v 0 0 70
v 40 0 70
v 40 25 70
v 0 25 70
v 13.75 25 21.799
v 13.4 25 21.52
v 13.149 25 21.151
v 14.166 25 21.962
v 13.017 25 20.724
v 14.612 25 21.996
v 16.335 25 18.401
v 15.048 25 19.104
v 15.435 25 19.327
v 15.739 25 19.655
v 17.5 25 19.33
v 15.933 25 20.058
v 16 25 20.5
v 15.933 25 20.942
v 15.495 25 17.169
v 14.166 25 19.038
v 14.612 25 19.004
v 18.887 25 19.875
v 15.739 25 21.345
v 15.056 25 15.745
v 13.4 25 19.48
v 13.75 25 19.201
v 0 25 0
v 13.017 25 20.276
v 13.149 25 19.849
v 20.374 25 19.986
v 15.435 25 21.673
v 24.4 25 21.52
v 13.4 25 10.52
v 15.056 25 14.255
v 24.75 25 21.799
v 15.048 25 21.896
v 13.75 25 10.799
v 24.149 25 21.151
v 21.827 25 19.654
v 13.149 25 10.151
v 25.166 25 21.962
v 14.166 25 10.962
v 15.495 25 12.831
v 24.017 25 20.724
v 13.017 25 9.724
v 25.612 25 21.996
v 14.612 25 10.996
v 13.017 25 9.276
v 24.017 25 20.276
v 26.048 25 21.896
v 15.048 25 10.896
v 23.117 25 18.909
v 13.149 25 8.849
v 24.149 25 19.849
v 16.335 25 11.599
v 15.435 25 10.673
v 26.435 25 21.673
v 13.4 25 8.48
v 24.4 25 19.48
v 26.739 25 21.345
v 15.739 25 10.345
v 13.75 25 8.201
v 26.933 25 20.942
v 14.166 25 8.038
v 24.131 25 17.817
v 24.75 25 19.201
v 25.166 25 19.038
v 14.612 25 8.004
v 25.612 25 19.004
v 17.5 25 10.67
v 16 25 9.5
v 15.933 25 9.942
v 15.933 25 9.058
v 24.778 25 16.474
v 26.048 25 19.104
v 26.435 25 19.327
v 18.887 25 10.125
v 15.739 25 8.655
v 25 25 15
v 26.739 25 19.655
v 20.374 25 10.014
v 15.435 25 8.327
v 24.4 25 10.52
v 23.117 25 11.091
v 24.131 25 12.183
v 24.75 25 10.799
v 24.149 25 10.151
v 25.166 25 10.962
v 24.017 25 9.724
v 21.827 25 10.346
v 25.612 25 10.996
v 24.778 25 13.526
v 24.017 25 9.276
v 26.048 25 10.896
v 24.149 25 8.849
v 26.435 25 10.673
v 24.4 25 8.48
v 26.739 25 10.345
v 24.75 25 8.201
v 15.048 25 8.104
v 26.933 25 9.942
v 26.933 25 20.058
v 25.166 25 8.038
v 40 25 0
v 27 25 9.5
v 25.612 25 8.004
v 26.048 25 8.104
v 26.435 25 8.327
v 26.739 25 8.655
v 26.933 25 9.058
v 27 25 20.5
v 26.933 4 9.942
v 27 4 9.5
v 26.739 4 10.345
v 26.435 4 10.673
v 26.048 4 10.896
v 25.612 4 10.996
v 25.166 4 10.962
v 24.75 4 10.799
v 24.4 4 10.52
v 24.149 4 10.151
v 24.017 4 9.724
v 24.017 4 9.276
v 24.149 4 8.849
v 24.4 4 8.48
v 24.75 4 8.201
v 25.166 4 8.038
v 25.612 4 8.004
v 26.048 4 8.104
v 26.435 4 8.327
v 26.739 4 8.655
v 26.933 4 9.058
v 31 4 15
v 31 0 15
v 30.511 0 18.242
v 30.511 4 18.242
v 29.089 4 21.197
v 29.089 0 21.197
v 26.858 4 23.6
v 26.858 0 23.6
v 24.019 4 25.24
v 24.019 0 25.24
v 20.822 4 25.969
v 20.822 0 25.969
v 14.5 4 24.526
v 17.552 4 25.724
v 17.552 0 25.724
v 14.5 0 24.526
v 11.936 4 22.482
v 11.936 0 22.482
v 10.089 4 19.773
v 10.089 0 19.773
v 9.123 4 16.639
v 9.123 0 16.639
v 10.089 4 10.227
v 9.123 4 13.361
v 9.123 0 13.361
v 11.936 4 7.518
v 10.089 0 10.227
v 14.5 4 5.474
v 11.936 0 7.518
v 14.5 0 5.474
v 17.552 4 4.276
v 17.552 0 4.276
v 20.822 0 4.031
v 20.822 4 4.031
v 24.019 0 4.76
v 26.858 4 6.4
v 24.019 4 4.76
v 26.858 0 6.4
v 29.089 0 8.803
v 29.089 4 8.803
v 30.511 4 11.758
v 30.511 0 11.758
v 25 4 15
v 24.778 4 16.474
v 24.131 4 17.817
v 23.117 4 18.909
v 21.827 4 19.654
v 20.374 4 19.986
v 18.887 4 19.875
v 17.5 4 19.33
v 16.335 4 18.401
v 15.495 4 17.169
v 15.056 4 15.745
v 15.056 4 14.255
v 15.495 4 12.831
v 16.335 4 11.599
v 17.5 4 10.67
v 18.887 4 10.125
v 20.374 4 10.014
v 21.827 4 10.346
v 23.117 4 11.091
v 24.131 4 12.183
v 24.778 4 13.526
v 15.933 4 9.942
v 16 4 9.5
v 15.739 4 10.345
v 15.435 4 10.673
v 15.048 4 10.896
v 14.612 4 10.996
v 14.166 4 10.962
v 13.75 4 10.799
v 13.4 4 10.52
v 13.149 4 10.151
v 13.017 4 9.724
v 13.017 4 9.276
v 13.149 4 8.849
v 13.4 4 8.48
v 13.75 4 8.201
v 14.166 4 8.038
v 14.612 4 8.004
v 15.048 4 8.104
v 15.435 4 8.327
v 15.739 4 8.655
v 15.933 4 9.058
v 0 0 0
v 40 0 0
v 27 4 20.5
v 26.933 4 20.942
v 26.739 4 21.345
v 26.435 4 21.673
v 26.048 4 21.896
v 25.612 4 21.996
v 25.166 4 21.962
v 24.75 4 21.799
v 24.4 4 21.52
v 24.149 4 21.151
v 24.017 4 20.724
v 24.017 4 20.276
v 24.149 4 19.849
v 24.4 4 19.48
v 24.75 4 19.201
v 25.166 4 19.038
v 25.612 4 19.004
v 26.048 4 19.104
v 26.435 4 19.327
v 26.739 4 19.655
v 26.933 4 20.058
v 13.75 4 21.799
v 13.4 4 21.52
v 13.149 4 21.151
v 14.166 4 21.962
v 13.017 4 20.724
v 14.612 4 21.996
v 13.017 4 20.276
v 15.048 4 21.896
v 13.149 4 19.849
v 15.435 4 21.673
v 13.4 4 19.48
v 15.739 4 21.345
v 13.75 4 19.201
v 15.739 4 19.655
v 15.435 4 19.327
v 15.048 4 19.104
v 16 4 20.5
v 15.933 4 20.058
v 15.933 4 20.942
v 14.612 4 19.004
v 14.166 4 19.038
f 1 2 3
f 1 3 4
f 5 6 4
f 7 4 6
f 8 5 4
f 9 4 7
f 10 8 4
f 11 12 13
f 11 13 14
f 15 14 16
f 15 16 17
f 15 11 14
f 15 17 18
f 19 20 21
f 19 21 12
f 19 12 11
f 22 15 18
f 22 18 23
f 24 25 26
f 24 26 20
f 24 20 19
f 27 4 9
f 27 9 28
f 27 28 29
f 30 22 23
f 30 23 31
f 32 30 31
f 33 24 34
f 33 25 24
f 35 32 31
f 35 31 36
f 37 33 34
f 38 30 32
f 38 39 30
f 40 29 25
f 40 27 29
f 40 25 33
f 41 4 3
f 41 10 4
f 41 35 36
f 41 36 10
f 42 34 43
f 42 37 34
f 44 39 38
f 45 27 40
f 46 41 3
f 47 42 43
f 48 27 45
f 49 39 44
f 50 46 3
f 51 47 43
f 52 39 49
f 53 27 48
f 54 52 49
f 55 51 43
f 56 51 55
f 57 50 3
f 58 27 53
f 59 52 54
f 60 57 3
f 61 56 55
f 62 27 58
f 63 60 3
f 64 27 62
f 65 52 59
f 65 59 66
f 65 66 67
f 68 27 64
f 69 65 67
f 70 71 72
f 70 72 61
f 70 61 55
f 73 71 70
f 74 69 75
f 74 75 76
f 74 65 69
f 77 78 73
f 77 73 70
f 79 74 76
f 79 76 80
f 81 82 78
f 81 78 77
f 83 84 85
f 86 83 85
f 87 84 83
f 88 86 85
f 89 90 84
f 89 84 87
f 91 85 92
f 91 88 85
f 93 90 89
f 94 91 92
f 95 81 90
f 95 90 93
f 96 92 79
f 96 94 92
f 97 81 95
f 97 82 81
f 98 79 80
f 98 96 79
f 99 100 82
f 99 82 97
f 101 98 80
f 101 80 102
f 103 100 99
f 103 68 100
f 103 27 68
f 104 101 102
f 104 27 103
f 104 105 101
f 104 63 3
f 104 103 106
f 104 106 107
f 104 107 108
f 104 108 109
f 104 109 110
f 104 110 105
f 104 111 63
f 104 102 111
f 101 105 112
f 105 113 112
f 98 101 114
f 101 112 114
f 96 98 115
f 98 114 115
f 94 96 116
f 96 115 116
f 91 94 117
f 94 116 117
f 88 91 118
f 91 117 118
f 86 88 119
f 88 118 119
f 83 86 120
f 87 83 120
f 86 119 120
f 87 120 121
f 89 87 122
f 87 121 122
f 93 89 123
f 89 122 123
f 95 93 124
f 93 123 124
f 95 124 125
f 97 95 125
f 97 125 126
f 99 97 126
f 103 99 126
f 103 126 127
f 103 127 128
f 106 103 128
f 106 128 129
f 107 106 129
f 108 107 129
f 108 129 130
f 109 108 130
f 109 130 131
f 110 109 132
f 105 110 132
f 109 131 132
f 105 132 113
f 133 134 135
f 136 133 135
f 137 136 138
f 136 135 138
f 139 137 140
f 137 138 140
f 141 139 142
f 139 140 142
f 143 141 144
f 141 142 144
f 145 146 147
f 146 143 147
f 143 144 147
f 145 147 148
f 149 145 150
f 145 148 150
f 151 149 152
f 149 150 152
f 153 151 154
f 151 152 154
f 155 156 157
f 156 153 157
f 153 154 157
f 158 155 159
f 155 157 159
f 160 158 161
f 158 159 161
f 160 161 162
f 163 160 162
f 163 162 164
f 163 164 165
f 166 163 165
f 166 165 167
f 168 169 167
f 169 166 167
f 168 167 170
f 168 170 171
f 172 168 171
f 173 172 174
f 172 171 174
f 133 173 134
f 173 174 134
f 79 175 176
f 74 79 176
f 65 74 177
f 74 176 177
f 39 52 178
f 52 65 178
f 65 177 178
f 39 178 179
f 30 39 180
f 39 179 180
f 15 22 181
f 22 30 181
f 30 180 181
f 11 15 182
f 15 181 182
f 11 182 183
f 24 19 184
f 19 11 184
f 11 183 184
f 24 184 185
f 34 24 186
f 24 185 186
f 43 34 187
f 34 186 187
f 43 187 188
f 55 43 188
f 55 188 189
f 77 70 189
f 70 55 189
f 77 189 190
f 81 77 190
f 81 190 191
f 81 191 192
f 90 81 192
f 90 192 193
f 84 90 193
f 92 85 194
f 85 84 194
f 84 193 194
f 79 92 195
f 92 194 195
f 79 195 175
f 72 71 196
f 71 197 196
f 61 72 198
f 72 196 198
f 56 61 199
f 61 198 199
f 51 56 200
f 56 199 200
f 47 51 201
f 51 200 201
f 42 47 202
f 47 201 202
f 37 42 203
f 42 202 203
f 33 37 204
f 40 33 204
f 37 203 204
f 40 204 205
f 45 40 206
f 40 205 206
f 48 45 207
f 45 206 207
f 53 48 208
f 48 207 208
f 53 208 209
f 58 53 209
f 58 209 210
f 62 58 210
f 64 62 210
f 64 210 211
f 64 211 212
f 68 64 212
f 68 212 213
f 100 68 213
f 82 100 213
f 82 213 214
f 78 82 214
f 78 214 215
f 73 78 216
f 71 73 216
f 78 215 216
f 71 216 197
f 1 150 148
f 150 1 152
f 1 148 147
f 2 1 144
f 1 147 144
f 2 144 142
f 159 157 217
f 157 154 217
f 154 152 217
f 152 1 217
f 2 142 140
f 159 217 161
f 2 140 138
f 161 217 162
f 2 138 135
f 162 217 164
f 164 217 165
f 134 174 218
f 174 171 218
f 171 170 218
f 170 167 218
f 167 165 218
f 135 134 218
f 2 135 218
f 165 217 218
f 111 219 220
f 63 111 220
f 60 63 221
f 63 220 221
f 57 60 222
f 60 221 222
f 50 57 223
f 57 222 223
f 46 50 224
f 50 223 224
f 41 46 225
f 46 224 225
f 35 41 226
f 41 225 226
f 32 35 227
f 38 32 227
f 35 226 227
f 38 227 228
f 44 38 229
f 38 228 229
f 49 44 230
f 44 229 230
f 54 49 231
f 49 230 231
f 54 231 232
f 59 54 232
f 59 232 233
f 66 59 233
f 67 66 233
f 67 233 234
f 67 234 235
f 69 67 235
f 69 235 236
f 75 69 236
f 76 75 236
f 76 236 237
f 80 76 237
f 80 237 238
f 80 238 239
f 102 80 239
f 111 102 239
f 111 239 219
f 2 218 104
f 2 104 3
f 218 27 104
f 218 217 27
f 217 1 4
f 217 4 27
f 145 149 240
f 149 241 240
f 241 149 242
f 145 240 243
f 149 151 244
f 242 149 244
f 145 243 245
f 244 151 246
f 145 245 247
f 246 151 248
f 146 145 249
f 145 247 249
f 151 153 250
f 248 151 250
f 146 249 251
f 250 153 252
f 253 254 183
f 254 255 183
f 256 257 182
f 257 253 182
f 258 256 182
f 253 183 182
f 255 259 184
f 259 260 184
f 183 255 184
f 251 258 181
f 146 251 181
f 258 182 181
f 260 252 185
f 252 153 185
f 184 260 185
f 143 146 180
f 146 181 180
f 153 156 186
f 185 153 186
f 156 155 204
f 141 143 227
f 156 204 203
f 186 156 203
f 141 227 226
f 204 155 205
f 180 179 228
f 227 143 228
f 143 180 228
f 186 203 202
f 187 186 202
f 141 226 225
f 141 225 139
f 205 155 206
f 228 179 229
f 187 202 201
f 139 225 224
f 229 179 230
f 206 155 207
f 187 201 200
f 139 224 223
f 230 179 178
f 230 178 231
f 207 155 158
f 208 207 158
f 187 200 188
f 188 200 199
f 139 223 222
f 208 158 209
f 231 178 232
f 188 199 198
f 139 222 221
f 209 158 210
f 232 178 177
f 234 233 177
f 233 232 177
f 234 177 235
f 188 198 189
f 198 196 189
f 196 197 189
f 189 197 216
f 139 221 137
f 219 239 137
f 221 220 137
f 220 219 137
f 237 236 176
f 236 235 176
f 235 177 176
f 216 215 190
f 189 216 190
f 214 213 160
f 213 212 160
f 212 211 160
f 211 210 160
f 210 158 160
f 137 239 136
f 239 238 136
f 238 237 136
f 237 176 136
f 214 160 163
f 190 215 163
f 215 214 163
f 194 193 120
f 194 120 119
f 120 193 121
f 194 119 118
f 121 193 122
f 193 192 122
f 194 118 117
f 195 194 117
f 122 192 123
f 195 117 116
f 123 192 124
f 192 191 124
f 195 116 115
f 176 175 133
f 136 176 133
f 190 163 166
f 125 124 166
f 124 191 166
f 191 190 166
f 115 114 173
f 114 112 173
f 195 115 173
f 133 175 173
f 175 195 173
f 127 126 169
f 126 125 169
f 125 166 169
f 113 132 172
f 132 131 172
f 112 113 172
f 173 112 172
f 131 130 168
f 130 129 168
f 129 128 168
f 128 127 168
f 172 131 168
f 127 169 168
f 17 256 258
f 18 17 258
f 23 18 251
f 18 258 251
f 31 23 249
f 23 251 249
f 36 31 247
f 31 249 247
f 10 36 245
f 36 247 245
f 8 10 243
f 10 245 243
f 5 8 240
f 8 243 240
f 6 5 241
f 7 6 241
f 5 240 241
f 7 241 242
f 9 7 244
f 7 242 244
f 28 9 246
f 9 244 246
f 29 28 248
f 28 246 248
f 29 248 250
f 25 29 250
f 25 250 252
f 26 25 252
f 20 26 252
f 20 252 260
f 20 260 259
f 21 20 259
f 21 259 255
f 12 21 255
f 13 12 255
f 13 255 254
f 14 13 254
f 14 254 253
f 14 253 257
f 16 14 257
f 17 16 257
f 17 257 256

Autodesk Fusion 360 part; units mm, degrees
sketch "Sketch1" plane through (0, 0, 0) normal (0, 1, 0) x (1, 0, 0)
  line L0 (0, 0) -> (40, 0)
  line L1 (40, 0) -> (40, -70)
  line L2 (40, -70) -> (0, -70)
  line L3 (0, -70) -> (0, 0)
  circle A0 centre (20, -15) radius 5
  circle A1 centre (20, -15) radius 11
  circle A2 centre (14.5, -20.5) radius 1.5
  circle A3 centre (25.5, -20.5) radius 1.5
  circle A4 centre (14.5, -9.5) radius 1.5
  circle A5 centre (25.5, -9.5) radius 1.5
  line L4 (20, -20) -> (20, -67) construction
  line L5 (0, -57) -> (40, -57) construction
  line L6 (20, -20) -> (20, -15) construction
  point P0 (20, -15)
  dimension "d1" = 40
  dimension "d2" = 70
  dimension "d3" = 10
  dimension "d4" = 15
  dimension "d5" = 22
  dimension "d6" = 11
  dimension "d7" = 11
  dimension "d8" = 3
  dimension "d9" = 3
  dimension "d10" = 3
  dimension "d11" = 3
  dimension "d12" = 52
  dimension "d13" = 42
extrude "Extrude1" add sketch "Sketch1" along normal blind 25 contours L0 L1 L2 L3 | A1 | A2 | A3 | A4 | A5
extrude "Extrude2" cut sketch "Sketch1" along normal blind 4 contours A1
extrude "Extrude3" cut sketch "Sketch1" along normal blind 27 contours A2 | A3 | A4 | A5
